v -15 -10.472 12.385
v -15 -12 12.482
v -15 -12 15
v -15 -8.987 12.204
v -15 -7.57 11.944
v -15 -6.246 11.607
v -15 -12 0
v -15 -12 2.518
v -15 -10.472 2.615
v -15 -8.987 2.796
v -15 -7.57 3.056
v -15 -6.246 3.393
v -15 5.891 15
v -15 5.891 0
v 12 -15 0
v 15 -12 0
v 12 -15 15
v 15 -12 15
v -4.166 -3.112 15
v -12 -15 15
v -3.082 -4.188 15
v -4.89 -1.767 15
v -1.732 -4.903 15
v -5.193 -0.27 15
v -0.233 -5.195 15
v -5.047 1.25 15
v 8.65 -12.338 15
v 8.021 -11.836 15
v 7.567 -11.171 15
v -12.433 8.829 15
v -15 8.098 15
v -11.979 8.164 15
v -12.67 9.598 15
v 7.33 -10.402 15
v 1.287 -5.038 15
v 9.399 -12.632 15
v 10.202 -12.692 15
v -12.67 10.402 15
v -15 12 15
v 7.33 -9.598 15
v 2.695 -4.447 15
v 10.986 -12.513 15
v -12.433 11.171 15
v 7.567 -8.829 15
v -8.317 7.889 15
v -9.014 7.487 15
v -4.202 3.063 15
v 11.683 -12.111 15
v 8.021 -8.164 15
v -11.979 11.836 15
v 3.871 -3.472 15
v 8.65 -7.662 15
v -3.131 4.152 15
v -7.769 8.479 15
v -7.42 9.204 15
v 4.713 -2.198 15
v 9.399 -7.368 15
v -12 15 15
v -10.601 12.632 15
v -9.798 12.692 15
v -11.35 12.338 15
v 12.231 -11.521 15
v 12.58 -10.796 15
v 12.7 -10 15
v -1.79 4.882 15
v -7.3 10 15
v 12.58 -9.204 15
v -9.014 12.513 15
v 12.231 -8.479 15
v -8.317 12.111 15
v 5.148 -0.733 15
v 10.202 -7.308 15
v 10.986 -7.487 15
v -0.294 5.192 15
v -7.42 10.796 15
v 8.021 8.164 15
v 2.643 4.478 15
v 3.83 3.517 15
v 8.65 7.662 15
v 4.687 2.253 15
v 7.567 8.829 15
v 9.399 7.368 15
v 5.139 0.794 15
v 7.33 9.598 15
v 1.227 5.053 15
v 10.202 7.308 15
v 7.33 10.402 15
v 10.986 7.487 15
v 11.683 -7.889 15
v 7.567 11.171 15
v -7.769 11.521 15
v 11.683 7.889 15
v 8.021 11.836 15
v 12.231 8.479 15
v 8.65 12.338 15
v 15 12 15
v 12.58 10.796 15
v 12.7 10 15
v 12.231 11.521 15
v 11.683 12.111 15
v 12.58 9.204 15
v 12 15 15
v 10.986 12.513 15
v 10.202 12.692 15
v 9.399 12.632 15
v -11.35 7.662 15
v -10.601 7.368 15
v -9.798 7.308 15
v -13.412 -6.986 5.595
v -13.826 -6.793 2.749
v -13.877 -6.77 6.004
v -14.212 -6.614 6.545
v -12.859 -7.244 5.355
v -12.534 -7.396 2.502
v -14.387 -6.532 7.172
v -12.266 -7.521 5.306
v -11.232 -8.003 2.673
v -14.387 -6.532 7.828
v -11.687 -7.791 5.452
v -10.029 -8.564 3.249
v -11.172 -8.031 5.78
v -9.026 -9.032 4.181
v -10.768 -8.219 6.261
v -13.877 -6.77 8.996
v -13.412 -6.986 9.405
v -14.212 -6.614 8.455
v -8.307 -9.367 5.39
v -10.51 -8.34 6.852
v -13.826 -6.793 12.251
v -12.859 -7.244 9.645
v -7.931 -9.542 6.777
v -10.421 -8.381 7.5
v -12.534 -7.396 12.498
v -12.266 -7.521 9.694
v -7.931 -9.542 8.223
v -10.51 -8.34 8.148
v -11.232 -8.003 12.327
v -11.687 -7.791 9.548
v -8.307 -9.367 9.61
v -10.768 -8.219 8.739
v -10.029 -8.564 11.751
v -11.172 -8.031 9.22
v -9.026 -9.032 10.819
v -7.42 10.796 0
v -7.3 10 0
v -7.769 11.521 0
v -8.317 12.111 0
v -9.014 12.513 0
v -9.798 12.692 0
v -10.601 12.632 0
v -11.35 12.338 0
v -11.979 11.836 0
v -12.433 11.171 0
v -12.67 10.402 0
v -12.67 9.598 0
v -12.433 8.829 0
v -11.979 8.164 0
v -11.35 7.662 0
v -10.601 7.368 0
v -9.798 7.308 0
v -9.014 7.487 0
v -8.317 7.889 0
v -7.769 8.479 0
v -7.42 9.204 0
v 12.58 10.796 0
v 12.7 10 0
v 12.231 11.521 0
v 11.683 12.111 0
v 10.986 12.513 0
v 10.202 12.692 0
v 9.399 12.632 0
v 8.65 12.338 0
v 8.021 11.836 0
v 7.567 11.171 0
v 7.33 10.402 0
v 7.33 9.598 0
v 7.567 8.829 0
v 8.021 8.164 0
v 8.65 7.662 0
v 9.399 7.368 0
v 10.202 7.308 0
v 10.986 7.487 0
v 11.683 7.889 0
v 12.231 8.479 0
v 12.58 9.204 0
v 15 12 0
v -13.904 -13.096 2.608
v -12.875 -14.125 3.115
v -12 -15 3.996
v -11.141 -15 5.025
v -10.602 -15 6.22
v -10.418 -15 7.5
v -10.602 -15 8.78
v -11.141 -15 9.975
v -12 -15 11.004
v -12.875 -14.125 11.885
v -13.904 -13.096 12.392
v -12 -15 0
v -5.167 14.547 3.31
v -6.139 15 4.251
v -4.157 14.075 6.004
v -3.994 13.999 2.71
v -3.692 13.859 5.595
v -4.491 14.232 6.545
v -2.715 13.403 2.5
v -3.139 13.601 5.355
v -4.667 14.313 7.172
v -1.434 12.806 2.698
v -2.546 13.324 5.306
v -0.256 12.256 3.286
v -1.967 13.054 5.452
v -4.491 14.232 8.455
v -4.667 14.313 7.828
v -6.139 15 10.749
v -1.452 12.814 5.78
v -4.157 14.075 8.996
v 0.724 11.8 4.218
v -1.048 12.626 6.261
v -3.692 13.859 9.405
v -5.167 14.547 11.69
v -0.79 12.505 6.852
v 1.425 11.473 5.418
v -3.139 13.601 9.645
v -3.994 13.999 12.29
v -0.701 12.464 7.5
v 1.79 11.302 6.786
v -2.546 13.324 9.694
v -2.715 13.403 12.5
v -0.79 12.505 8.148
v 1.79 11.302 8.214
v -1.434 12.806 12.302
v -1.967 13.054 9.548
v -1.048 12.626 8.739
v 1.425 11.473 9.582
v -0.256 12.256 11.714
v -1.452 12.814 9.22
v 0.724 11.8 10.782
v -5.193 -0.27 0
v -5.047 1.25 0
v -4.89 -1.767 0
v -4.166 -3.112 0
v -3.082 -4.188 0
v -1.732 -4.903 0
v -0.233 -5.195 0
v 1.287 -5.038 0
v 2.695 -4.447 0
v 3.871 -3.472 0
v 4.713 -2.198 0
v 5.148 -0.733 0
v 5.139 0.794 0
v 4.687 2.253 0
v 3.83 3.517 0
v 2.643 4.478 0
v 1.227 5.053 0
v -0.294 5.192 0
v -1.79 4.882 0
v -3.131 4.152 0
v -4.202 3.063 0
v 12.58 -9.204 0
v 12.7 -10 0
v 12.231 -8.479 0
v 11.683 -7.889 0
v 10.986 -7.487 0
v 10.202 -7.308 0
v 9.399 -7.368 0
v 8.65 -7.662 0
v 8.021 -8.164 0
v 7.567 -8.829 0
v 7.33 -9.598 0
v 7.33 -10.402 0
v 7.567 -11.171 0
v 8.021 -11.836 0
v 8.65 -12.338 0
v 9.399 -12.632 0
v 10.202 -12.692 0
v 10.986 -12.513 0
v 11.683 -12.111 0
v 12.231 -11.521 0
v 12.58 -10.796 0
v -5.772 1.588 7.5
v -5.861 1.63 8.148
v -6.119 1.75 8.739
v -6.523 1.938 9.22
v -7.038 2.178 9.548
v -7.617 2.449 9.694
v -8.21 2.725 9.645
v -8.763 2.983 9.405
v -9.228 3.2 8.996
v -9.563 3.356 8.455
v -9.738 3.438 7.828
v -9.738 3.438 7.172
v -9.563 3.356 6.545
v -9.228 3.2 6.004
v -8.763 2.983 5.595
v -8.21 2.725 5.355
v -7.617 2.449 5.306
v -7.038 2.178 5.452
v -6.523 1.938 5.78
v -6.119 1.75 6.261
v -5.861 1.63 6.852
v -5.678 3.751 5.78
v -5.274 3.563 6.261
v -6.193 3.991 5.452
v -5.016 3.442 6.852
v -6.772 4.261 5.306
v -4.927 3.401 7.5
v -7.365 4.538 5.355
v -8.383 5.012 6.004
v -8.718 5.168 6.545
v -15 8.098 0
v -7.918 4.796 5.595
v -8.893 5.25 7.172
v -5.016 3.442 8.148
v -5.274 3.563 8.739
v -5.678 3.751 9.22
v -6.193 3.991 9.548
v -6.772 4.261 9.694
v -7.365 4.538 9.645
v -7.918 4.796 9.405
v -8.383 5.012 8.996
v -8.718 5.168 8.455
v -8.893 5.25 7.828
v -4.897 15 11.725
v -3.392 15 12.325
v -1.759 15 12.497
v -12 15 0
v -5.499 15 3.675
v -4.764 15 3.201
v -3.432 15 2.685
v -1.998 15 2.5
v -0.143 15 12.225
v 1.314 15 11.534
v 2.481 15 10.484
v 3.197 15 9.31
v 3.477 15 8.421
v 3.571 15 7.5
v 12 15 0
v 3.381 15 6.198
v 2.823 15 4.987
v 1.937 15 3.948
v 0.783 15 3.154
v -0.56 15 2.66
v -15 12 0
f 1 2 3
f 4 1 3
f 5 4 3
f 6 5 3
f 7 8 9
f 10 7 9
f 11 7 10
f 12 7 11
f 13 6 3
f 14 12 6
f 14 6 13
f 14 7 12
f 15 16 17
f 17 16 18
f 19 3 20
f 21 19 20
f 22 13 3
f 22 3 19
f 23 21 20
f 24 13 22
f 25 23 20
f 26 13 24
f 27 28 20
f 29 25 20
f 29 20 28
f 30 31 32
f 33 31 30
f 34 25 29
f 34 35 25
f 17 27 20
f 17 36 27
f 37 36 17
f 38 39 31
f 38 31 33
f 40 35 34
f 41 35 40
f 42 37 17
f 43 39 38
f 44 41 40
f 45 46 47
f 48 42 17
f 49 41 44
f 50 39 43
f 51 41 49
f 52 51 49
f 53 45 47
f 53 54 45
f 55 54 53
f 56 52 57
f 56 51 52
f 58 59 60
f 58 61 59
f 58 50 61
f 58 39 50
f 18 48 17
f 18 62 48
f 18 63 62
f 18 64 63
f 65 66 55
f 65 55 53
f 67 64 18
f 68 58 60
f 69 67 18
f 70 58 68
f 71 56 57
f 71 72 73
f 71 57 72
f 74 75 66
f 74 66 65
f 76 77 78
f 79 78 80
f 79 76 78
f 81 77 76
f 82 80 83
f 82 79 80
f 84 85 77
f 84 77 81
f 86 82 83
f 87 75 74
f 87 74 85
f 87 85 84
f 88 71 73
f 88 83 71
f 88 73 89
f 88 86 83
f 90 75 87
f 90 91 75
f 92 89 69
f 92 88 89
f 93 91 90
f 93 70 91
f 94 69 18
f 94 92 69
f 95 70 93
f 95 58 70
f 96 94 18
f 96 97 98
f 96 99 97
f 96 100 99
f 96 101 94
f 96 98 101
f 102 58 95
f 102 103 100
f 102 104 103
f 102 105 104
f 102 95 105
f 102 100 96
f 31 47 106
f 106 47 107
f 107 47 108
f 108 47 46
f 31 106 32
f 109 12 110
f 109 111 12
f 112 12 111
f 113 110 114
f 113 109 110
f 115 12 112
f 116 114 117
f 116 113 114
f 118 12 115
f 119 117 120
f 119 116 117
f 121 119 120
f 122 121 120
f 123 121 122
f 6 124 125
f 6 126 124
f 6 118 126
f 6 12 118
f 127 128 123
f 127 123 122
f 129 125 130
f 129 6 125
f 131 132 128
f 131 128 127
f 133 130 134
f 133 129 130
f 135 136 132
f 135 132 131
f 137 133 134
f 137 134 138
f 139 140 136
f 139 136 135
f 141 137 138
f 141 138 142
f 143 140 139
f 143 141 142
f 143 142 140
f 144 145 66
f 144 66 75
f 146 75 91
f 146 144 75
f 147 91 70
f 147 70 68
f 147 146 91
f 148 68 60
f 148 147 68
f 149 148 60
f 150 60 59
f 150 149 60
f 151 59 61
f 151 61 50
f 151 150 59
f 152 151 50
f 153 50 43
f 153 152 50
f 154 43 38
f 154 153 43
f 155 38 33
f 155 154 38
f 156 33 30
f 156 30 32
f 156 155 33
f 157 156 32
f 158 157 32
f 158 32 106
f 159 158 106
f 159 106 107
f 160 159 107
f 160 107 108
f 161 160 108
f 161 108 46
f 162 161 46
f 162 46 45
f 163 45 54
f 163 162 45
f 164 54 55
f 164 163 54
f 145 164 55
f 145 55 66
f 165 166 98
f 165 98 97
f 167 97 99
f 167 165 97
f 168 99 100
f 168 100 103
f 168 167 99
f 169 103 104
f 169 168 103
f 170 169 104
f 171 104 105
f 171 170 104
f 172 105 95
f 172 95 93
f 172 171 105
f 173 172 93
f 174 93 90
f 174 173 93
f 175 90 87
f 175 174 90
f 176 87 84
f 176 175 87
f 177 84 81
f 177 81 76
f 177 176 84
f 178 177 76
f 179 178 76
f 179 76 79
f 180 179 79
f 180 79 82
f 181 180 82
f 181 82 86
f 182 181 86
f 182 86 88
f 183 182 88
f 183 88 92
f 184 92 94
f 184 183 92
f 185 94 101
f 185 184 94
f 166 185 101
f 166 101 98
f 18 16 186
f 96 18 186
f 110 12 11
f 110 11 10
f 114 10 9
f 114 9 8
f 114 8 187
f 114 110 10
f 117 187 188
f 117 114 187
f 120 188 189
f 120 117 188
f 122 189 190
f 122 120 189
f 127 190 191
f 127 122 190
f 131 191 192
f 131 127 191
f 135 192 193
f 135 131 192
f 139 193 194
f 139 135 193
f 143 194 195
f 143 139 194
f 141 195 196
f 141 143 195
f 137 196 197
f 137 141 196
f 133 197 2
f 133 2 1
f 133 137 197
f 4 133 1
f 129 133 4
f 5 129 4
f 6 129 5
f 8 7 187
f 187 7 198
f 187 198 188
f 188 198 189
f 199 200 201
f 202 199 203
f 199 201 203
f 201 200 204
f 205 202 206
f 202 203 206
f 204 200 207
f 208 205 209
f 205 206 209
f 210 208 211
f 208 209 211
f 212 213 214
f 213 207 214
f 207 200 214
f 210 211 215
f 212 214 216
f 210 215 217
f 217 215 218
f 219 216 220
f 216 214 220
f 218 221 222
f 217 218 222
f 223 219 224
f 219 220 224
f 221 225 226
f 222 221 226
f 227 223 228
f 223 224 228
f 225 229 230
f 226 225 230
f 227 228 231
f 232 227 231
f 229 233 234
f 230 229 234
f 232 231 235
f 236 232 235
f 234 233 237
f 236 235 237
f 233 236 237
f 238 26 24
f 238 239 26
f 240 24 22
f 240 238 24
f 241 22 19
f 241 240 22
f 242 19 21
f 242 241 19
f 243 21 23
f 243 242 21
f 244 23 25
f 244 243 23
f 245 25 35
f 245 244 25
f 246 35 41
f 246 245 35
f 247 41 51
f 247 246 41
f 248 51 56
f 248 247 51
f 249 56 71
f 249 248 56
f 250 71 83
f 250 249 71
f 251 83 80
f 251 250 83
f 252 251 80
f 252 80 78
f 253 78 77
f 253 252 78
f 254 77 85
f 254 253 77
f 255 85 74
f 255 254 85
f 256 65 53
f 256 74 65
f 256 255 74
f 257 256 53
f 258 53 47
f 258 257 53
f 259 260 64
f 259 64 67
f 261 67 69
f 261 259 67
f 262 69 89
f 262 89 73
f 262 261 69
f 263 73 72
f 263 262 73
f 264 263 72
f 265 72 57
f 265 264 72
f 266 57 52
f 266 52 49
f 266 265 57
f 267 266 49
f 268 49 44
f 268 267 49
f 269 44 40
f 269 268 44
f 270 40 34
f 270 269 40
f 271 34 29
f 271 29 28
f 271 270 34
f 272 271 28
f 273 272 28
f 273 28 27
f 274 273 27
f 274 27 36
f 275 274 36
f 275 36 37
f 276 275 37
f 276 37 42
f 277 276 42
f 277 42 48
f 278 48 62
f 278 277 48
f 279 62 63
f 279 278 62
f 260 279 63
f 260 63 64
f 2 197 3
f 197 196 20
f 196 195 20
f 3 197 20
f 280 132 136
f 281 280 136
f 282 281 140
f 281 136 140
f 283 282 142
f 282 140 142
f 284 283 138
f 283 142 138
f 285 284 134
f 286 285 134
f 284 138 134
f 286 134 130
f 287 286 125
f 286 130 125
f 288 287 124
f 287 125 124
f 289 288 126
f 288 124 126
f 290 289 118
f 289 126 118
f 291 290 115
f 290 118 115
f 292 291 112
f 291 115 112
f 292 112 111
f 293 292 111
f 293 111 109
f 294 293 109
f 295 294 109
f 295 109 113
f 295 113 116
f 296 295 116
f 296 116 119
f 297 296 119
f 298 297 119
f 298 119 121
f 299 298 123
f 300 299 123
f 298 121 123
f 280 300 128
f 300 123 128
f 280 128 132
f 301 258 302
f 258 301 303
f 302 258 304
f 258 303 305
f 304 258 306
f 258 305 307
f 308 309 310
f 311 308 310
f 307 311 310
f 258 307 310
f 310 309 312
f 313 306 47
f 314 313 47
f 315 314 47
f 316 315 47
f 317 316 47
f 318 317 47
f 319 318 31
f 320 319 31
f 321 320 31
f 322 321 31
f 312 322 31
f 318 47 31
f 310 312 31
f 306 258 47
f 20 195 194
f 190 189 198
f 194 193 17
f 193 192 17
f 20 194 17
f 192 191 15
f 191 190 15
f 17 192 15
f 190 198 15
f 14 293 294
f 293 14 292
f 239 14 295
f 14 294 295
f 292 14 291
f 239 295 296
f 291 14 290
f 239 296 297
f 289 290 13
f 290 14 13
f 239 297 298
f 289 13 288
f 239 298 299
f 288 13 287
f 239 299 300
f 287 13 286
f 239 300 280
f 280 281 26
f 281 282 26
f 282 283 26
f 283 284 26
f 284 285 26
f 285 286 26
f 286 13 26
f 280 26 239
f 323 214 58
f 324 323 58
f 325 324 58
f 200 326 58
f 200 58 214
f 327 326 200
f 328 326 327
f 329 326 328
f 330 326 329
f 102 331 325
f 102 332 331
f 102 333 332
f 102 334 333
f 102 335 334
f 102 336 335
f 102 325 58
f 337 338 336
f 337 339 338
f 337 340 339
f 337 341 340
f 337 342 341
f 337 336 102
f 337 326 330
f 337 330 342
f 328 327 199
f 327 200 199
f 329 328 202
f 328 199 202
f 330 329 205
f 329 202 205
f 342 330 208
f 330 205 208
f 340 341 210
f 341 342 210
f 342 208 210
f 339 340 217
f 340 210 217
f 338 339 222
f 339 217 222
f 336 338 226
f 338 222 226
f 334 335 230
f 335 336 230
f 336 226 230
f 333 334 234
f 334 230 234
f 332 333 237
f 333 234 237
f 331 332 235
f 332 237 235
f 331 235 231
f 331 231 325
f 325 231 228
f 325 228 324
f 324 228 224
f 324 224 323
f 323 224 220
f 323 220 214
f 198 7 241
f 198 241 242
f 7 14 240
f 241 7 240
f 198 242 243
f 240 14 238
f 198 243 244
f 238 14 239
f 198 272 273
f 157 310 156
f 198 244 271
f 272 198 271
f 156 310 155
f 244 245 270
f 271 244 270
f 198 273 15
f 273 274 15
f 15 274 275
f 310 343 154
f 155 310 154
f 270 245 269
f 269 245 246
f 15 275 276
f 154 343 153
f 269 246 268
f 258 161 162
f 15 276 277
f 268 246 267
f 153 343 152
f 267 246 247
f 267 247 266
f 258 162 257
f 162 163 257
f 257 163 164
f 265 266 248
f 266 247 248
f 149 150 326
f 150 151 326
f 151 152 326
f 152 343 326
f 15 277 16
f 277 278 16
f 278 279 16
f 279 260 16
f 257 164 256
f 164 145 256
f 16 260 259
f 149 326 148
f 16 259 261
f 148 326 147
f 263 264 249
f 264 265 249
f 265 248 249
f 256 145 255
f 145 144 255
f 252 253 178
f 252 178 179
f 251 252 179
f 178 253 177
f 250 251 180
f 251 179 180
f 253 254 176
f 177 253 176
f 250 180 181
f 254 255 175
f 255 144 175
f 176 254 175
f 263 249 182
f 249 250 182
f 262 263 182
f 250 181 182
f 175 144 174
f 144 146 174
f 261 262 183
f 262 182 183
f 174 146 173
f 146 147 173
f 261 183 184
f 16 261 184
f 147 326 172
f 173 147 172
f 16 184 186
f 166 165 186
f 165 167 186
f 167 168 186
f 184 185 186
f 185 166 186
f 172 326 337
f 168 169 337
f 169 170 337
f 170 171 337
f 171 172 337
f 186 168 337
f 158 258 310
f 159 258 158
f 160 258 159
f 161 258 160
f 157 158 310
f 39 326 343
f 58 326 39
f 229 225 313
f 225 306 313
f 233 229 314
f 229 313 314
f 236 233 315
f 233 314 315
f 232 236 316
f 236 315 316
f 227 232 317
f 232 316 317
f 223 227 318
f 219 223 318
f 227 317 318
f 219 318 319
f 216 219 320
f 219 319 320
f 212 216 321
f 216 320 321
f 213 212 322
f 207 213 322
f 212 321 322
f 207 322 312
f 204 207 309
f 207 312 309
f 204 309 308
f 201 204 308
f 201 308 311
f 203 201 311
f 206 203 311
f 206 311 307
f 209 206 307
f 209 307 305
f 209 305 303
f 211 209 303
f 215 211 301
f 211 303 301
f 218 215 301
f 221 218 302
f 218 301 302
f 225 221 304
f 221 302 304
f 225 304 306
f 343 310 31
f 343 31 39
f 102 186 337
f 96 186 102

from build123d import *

# Parameters (mm, degrees)
F0_W      = 30
F0_H      = 30
F0_R      = 2.7
F0_R_2    = 5.2
F1_DEPTH  = 15
F2_SIZE   = 3
F4_DEPTH  = 25
F5_R      = 2.2
F6_DEPTH  = 35
F8_R      = 5
F9_DEPTH  = 25
F11_R     = 5
F12_DEPTH = 25


with BuildPart() as f1:
    # F0 (on Top) → F1 (new body)
    with BuildSketch(Plane.XY):
        Rectangle(F0_W, F0_H)
        with Locations((10, -10)):
            Circle(F0_R, mode=Mode.SUBTRACT)
        with Locations((-10, 10)):
            Circle(F0_R, mode=Mode.SUBTRACT)
        Circle(F0_R_2, mode=Mode.SUBTRACT)
        with Locations((10, 10)):
            Circle(F0_R, mode=Mode.SUBTRACT)
    extrude(amount=F1_DEPTH)

    # F2
    f2_edges = [f1.edges().sort_by_distance(p)[0] for p in [
        (15, 15, 7.5),
        (15, -15, 7.5),
        (-15, -15, 7.5),
        (-15, 15, 7.5),
    ]]
    chamfer(f2_edges, length=F2_SIZE)

    # F3 (on face) → F4 (cut)
    with BuildSketch(Plane.XY.offset(15)):
        Polygon((-29.3442261462, 14.7868152936), (-29.7668444079, 13.8805075065), (-30.1894626697, 12.9741997195), (-3.0002290586, 0.2956518673), (-2.1549925351, 2.1082674413), align=None)
    extrude(amount=-F4_DEPTH, mode=Mode.SUBTRACT)

    # F5 (on face) → F6 (cut, symmetric)
    with BuildSketch(Plane(origin=(0.4226182617, 0.906307787, 0), x_dir=(0.906307787, -0.4226182617, 0), z_dir=(-0.4226182617, -0.906307787, 0))):
        with Locations((-8.1029403289, 7.5)):
            Circle(F5_R)
    extrude(amount=F6_DEPTH, both=True, mode=Mode.SUBTRACT)

    # F8 (on offset) → F9 (cut)
    with BuildSketch(Plane(origin=(4.6488008791, 9.9693856574, 0), x_dir=(0.906307787, -0.4226182617, 0), z_dir=(-0.4226182617, -0.906307787, 0))):
        with Locations((-8.1029403289, 7.5)):
            Circle(F8_R)
    extrude(amount=-F9_DEPTH, mode=Mode.SUBTRACT)

    # F11 (on offset) → F12 (cut)
    with BuildSketch(Plane(origin=(-5.0714191409, -10.8756934444, 0), x_dir=(0.906307787, -0.4226182617, 0), z_dir=(-0.4226182617, -0.906307787, 0))):
        with Locations((-8.1029403289, 7.5)):
            Circle(F11_R)
    extrude(amount=F12_DEPTH, mode=Mode.SUBTRACT)


solid = f1.part
